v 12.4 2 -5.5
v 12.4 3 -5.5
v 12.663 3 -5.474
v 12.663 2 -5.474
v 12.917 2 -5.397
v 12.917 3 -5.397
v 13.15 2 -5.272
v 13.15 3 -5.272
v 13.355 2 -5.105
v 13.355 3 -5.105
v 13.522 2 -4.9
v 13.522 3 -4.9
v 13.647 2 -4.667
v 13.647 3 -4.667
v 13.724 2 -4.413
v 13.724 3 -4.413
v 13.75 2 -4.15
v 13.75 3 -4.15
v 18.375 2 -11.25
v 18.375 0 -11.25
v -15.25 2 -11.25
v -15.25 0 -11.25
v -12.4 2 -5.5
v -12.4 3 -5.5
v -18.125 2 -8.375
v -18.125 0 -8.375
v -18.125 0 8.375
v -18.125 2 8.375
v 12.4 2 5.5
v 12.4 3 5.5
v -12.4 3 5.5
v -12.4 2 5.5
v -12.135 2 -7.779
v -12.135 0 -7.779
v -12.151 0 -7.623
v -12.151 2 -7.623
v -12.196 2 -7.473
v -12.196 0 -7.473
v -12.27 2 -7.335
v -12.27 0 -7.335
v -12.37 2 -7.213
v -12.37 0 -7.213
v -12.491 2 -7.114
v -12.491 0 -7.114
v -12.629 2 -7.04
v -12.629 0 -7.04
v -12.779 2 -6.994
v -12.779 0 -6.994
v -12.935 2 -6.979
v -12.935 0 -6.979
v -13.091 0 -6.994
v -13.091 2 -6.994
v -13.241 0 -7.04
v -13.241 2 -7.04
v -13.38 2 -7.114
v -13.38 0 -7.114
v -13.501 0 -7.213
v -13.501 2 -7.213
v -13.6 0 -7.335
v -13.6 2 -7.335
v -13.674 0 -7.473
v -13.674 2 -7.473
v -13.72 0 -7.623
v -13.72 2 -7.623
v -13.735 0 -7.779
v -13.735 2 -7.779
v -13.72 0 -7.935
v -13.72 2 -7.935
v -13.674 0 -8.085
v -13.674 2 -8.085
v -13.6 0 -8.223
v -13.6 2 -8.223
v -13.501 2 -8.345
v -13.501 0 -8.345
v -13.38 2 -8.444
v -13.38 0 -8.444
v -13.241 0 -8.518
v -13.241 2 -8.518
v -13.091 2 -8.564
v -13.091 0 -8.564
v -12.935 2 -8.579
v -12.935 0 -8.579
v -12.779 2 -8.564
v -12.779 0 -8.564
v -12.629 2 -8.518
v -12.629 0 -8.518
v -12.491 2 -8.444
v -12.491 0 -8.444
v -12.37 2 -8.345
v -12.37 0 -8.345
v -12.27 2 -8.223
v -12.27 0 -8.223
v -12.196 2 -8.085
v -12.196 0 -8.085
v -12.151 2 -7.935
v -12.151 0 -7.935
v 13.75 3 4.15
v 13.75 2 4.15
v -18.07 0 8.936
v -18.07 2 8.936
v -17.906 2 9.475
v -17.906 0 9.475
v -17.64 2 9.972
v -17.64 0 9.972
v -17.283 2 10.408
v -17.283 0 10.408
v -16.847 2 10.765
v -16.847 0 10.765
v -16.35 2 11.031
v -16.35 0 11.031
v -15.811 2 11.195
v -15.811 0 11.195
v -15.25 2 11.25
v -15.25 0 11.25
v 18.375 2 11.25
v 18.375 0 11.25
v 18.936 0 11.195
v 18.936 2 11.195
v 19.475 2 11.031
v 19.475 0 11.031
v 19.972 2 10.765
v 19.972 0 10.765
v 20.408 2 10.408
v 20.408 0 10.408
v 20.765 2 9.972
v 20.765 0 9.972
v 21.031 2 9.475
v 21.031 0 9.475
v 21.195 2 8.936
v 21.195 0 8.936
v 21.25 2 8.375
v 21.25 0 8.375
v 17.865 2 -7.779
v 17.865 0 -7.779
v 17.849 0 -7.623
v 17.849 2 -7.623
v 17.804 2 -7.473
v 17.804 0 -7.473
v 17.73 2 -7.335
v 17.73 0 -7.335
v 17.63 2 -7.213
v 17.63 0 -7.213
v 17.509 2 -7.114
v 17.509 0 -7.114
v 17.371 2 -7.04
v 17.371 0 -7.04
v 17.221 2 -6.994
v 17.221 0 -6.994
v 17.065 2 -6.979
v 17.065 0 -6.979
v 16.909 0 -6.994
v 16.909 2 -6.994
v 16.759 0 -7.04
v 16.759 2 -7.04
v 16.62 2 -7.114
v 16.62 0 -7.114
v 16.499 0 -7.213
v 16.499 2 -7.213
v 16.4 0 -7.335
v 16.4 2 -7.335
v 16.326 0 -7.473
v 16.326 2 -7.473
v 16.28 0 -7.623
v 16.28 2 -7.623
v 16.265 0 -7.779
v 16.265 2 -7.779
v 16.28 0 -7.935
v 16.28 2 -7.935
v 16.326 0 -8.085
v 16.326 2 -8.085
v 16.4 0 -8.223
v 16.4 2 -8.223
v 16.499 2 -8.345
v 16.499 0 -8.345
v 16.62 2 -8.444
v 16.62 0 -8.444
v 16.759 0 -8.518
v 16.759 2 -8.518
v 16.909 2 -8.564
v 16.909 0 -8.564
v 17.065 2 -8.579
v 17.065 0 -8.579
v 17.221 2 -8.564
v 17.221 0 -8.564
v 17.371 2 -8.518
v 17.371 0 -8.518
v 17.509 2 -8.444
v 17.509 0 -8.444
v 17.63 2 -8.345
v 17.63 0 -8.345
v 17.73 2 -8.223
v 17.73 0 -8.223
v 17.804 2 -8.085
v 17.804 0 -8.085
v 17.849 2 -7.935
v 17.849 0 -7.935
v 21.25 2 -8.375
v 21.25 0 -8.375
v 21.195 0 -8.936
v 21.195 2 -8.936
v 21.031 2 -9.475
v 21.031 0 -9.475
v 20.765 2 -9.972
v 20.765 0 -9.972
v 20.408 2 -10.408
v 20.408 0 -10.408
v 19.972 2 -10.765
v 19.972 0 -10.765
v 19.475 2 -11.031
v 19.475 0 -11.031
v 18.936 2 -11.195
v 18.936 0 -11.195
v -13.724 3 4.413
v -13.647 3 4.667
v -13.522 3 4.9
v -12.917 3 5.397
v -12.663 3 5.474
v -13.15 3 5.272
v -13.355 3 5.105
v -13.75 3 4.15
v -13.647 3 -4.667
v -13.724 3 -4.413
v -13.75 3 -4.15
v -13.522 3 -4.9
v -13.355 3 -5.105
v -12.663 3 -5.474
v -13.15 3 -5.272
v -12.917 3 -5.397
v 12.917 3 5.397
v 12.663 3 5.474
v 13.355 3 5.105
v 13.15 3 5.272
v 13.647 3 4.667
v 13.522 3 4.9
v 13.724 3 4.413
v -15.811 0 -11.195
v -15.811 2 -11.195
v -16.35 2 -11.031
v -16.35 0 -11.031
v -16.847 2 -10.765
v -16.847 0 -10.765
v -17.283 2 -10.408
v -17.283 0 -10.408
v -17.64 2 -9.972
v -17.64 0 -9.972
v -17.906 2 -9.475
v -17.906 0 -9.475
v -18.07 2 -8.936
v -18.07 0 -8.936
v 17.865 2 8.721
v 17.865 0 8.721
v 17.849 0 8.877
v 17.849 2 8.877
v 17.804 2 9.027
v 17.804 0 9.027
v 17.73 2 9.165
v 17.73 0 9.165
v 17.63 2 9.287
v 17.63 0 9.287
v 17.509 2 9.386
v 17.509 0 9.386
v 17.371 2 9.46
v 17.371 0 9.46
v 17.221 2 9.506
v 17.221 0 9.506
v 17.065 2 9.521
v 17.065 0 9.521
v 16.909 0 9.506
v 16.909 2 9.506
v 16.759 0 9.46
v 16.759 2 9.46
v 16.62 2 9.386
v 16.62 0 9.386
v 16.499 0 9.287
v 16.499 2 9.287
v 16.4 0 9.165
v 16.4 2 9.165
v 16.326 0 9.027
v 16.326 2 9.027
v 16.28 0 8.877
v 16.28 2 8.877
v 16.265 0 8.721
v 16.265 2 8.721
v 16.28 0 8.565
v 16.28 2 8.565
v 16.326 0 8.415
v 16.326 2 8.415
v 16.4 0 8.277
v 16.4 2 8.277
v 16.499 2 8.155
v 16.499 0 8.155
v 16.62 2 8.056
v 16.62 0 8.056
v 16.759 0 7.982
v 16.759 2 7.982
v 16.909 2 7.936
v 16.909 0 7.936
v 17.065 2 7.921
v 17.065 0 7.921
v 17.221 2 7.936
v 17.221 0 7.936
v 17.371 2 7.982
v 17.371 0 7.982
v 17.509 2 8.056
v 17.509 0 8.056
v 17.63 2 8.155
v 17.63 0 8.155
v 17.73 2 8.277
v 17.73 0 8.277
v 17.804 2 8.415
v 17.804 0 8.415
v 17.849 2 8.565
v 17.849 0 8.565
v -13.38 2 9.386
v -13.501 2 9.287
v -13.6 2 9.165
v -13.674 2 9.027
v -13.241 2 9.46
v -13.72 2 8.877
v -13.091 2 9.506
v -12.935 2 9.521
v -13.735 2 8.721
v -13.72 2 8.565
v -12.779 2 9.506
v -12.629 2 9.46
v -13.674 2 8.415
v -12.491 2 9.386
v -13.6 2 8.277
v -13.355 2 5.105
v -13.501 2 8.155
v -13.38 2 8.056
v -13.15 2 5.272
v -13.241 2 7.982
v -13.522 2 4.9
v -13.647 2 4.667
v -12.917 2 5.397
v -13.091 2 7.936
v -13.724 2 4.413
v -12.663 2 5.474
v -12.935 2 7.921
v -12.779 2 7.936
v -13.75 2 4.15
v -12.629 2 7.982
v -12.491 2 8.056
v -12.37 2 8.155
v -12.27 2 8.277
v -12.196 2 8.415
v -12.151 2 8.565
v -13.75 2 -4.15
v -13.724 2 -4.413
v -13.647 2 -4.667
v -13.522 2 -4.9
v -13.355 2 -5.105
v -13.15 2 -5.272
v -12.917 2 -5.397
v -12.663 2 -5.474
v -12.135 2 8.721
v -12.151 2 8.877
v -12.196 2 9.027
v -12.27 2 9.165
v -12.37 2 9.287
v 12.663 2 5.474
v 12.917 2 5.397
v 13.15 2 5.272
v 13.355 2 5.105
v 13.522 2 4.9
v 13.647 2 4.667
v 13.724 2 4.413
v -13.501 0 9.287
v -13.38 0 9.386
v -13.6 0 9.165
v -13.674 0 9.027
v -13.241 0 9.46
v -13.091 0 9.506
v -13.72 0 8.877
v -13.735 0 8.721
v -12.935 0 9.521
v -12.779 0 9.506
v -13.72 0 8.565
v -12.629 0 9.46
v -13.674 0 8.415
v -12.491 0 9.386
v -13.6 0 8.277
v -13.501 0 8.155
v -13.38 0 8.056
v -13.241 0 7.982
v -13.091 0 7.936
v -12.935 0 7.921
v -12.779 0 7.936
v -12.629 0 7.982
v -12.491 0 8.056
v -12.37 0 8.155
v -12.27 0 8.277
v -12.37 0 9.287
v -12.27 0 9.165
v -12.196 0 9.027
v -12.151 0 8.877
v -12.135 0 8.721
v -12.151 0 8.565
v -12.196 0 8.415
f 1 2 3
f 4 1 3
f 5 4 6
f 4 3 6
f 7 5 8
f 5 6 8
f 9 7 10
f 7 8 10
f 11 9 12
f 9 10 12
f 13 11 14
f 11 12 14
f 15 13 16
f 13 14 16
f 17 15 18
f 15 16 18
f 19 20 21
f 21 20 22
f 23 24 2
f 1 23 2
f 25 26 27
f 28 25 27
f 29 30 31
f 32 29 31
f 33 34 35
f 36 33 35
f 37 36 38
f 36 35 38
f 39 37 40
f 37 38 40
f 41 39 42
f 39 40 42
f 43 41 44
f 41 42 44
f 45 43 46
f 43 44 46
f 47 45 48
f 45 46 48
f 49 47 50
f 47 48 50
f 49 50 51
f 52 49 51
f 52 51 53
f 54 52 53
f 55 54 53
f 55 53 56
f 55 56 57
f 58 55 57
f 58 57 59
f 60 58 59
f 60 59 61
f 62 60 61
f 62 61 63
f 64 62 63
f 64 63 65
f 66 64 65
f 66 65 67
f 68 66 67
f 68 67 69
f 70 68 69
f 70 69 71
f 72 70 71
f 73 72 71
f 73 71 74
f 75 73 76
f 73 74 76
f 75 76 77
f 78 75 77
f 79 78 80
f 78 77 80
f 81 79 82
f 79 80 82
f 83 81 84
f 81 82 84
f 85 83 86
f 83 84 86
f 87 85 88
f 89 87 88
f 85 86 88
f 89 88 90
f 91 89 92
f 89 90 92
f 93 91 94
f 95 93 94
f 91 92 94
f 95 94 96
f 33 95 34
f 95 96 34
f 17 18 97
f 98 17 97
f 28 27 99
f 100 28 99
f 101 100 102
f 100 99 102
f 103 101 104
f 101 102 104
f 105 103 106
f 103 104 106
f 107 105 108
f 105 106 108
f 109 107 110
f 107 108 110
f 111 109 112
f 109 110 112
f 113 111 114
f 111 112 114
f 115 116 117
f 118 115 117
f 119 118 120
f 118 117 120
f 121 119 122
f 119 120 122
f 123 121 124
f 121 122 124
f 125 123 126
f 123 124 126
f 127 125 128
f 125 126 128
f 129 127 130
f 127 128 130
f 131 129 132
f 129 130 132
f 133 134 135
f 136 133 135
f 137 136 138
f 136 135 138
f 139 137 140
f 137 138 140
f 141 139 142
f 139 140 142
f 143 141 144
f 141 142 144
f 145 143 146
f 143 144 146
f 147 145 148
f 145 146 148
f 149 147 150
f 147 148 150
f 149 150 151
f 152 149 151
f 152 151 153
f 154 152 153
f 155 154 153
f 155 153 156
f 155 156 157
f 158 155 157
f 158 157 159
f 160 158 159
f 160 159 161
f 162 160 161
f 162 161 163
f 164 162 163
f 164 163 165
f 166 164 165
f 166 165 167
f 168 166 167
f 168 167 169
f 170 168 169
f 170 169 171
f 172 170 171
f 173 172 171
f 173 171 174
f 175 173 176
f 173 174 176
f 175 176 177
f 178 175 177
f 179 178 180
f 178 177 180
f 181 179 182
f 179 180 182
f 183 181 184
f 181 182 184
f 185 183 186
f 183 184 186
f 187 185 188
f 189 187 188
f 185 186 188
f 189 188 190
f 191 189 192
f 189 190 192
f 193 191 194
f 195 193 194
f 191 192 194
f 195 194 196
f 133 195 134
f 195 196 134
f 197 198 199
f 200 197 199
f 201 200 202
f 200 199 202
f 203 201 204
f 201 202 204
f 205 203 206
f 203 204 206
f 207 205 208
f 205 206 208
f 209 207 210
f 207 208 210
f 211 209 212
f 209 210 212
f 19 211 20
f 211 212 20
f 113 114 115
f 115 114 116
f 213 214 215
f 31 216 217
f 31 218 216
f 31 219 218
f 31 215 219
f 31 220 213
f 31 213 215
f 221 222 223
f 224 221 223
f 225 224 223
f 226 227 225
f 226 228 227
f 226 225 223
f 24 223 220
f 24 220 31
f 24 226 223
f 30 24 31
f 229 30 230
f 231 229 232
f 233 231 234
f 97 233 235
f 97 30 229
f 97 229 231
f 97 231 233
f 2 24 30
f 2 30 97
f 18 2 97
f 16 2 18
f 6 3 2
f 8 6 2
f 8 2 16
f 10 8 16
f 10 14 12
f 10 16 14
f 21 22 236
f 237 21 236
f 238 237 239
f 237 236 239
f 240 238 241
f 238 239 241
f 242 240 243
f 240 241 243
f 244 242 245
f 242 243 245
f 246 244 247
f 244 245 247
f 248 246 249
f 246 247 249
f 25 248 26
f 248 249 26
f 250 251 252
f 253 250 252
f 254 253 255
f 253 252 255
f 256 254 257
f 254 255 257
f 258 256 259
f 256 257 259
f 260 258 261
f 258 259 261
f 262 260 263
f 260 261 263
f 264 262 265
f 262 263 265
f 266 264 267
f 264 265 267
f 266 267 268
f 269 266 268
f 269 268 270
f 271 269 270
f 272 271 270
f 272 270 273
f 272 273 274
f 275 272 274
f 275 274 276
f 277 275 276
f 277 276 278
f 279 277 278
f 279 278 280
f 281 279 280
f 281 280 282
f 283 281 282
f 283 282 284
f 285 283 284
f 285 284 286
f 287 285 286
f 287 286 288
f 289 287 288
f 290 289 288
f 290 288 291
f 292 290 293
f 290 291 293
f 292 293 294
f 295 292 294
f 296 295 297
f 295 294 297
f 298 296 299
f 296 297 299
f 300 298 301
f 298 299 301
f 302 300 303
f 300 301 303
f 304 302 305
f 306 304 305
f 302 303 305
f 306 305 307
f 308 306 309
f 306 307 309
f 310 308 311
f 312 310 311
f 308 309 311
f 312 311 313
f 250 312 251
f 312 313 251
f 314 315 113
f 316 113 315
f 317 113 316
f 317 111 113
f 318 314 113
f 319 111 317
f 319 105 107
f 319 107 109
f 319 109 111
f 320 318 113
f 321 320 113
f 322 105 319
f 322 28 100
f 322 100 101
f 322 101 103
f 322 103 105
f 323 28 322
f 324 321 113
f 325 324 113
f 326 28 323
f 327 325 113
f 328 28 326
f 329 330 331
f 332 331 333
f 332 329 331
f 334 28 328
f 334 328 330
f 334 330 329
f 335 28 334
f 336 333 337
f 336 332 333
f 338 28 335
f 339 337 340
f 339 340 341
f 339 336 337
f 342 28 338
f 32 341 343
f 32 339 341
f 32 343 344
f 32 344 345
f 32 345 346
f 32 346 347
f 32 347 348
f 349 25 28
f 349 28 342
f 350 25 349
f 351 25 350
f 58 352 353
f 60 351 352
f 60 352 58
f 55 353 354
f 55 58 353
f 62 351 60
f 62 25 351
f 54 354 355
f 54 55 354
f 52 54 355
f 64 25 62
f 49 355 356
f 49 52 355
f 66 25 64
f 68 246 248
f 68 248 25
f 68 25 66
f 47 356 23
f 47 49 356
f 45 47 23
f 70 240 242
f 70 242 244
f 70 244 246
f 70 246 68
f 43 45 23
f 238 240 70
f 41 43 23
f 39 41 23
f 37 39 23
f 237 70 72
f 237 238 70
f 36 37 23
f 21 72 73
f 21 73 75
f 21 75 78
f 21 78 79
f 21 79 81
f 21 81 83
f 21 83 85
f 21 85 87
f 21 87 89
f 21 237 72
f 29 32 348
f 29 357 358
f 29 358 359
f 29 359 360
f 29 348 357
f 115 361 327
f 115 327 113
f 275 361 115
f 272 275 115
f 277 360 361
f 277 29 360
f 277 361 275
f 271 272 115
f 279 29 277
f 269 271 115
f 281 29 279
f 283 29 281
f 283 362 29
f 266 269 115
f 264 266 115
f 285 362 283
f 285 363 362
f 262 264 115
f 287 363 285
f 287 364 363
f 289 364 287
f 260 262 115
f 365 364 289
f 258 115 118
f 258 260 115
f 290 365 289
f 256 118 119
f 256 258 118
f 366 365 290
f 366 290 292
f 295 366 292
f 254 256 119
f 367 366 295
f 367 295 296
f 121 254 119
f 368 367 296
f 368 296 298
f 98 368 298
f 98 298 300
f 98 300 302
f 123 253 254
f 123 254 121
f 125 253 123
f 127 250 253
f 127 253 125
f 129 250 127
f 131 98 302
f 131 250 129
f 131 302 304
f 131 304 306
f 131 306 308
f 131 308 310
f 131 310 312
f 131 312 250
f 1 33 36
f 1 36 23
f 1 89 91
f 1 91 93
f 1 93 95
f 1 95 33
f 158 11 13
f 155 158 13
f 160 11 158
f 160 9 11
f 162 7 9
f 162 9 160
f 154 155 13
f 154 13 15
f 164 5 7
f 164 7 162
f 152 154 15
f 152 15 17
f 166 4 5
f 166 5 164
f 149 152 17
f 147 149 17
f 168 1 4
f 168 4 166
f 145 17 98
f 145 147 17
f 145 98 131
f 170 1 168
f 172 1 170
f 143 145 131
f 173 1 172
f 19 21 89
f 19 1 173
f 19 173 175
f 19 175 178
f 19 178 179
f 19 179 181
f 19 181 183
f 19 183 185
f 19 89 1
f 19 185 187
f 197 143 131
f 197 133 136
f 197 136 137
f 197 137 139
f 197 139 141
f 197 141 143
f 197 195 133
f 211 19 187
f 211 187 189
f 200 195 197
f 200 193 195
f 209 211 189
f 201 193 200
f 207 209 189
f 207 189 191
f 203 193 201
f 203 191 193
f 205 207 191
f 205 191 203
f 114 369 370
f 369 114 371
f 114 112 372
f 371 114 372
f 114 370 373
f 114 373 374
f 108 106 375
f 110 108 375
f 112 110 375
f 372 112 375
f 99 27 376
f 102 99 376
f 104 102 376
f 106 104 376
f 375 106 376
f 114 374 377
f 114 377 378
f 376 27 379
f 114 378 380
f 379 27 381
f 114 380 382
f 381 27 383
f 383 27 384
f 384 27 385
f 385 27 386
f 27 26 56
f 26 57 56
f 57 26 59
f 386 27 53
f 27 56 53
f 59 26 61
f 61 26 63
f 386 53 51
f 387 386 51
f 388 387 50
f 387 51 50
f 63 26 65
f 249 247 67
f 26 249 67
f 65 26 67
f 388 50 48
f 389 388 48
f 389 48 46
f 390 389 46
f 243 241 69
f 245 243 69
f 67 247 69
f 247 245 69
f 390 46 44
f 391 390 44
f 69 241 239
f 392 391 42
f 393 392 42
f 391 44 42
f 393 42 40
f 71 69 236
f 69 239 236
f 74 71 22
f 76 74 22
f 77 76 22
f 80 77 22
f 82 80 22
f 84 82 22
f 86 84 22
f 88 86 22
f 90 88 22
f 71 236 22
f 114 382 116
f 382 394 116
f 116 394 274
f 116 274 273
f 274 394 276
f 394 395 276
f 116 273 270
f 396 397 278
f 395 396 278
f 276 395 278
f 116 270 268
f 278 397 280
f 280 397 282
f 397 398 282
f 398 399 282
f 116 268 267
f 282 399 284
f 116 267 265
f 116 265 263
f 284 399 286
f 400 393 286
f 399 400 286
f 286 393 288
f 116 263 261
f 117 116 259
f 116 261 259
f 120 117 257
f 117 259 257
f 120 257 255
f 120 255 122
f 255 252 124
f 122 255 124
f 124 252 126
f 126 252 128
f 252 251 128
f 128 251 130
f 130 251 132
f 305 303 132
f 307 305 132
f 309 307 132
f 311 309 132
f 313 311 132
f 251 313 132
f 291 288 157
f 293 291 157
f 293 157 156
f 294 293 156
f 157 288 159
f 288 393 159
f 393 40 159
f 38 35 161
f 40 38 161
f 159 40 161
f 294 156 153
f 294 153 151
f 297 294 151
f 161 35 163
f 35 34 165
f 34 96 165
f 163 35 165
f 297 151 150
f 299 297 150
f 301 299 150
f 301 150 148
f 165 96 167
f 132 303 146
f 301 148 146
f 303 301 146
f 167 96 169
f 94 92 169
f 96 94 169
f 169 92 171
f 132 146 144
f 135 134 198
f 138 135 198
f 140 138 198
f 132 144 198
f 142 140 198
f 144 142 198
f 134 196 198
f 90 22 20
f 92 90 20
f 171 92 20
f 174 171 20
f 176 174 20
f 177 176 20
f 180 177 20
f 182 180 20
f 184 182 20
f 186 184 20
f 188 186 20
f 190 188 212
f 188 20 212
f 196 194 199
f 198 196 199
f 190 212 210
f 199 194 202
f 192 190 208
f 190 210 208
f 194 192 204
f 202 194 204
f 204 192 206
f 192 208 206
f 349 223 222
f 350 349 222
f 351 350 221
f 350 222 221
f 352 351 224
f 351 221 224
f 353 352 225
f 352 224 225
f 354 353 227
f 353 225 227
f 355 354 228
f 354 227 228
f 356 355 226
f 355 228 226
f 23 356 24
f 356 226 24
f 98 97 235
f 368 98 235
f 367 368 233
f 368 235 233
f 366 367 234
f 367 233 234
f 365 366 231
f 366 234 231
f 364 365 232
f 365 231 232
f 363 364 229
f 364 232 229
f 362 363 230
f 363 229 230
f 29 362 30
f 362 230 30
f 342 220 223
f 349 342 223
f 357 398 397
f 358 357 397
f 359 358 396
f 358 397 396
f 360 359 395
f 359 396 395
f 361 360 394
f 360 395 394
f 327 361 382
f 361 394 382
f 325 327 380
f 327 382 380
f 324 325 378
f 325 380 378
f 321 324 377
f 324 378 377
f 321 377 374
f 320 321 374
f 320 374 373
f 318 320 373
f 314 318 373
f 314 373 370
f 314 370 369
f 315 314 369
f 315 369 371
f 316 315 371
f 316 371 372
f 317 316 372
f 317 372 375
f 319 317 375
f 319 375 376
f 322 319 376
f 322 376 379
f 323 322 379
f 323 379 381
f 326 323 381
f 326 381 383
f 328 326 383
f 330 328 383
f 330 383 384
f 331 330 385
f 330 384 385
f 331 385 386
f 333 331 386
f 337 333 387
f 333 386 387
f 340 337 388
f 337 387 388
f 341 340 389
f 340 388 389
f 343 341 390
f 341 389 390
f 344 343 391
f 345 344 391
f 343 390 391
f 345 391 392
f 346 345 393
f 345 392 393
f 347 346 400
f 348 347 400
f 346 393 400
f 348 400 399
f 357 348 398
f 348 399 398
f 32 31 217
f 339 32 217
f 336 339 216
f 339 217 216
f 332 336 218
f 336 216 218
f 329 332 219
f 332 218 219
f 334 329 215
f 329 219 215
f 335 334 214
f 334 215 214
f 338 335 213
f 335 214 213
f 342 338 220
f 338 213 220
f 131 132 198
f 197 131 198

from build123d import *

# Parameters (mm, degrees)
BOSS_EXTRUDE1_DEPTH = 3
CUT_EXTRUDE1_START  = -1
CUT_EXTRUDE1_DEPTH  = 1
SKETCH3_R           = 0.8
CUT_EXTRUDE2_DEPTH  = 25.230662393


with BuildPart() as part:
    # Sketch1 → Boss-Extrude1 (new body)
    with BuildSketch(Plane(origin=(0, 0, 0), x_dir=(1, 0, 0), z_dir=(0, 1, 0))):
        with BuildLine():
            Line((21.25, -8.375), (21.25, 8.375))
            ThreePointArc((21.25, 8.375), (20.407931996, 10.407931996), (18.375, 11.25))
            Line((18.375, 11.25), (-15.25, 11.25))
            ThreePointArc((-15.25, 11.25), (-17.282931996, 10.407931996), (-18.125, 8.375))
            Line((-18.125, 8.375), (-18.125, -8.375))
            ThreePointArc((-18.125, -8.375), (-17.282931996, -10.407931996), (-15.25, -11.25))
            Line((-15.25, -11.25), (18.375, -11.25))
            ThreePointArc((18.375, -11.25), (20.407931996, -10.407931996), (21.25, -8.375))
        make_face()
    extrude(amount=BOSS_EXTRUDE1_DEPTH)

    # Sketch2 → Cut-Extrude1 (cut)
    with BuildSketch(Plane(origin=(0, 3, 0), x_dir=(1, 0, 0), z_dir=(0, 1, 0)).offset(CUT_EXTRUDE1_START)):
        with BuildLine():
            ThreePointArc((18.375, -11.25), (20.407931996, -10.407931996), (21.25, -8.375))
            Line((21.25, -8.375), (21.25, 8.375))
            ThreePointArc((21.25, 8.375), (20.407931996, 10.407931996), (18.375, 11.25))
            Line((18.375, 11.25), (-15.25, 11.25))
            ThreePointArc((-15.25, 11.25), (-17.282931996, 10.407931996), (-18.125, 8.375))
            Line((-18.125, 8.375), (-18.125, -8.375))
            ThreePointArc((-18.125, -8.375), (-17.282931996, -10.407931996), (-15.25, -11.25))
            Line((-15.25, -11.25), (18.375, -11.25))
        make_face()
        with BuildLine():
            Line((-13.75, -4.15), (-13.75, 4.15))
            ThreePointArc((-13.75, 4.15), (-13.354594155, 5.104594155), (-12.4, 5.5))
            Line((-12.4, 5.5), (12.4, 5.5))
            ThreePointArc((12.4, 5.5), (13.354594155, 5.104594155), (13.75, 4.15))
            Line((13.75, 4.15), (13.75, -4.15))
            ThreePointArc((13.75, -4.15), (13.354594155, -5.104594155), (12.4, -5.5))
            Line((12.4, -5.5), (-12.4, -5.5))
            ThreePointArc((-12.4, -5.5), (-13.354594155, -5.104594155), (-13.75, -4.15))
        make_face(mode=Mode.SUBTRACT)
    extrude(amount=CUT_EXTRUDE1_DEPTH, mode=Mode.SUBTRACT)

    # Sketch3 → Cut-Extrude2 (cut, through all)
    with BuildSketch(Plane.XZ):
        with Locations((17.064715841, -7.779032038)):
            Circle(SKETCH3_R)
        with Locations((-12.935284159, -7.779032038)):
            Circle(SKETCH3_R)
        with Locations((-12.935284159, 8.720967962)):
            Circle(SKETCH3_R)
        with Locations((17.064715841, 8.720967962)):
            Circle(SKETCH3_R)
    extrude(amount=-CUT_EXTRUDE2_DEPTH, mode=Mode.SUBTRACT)


solid = part.part
